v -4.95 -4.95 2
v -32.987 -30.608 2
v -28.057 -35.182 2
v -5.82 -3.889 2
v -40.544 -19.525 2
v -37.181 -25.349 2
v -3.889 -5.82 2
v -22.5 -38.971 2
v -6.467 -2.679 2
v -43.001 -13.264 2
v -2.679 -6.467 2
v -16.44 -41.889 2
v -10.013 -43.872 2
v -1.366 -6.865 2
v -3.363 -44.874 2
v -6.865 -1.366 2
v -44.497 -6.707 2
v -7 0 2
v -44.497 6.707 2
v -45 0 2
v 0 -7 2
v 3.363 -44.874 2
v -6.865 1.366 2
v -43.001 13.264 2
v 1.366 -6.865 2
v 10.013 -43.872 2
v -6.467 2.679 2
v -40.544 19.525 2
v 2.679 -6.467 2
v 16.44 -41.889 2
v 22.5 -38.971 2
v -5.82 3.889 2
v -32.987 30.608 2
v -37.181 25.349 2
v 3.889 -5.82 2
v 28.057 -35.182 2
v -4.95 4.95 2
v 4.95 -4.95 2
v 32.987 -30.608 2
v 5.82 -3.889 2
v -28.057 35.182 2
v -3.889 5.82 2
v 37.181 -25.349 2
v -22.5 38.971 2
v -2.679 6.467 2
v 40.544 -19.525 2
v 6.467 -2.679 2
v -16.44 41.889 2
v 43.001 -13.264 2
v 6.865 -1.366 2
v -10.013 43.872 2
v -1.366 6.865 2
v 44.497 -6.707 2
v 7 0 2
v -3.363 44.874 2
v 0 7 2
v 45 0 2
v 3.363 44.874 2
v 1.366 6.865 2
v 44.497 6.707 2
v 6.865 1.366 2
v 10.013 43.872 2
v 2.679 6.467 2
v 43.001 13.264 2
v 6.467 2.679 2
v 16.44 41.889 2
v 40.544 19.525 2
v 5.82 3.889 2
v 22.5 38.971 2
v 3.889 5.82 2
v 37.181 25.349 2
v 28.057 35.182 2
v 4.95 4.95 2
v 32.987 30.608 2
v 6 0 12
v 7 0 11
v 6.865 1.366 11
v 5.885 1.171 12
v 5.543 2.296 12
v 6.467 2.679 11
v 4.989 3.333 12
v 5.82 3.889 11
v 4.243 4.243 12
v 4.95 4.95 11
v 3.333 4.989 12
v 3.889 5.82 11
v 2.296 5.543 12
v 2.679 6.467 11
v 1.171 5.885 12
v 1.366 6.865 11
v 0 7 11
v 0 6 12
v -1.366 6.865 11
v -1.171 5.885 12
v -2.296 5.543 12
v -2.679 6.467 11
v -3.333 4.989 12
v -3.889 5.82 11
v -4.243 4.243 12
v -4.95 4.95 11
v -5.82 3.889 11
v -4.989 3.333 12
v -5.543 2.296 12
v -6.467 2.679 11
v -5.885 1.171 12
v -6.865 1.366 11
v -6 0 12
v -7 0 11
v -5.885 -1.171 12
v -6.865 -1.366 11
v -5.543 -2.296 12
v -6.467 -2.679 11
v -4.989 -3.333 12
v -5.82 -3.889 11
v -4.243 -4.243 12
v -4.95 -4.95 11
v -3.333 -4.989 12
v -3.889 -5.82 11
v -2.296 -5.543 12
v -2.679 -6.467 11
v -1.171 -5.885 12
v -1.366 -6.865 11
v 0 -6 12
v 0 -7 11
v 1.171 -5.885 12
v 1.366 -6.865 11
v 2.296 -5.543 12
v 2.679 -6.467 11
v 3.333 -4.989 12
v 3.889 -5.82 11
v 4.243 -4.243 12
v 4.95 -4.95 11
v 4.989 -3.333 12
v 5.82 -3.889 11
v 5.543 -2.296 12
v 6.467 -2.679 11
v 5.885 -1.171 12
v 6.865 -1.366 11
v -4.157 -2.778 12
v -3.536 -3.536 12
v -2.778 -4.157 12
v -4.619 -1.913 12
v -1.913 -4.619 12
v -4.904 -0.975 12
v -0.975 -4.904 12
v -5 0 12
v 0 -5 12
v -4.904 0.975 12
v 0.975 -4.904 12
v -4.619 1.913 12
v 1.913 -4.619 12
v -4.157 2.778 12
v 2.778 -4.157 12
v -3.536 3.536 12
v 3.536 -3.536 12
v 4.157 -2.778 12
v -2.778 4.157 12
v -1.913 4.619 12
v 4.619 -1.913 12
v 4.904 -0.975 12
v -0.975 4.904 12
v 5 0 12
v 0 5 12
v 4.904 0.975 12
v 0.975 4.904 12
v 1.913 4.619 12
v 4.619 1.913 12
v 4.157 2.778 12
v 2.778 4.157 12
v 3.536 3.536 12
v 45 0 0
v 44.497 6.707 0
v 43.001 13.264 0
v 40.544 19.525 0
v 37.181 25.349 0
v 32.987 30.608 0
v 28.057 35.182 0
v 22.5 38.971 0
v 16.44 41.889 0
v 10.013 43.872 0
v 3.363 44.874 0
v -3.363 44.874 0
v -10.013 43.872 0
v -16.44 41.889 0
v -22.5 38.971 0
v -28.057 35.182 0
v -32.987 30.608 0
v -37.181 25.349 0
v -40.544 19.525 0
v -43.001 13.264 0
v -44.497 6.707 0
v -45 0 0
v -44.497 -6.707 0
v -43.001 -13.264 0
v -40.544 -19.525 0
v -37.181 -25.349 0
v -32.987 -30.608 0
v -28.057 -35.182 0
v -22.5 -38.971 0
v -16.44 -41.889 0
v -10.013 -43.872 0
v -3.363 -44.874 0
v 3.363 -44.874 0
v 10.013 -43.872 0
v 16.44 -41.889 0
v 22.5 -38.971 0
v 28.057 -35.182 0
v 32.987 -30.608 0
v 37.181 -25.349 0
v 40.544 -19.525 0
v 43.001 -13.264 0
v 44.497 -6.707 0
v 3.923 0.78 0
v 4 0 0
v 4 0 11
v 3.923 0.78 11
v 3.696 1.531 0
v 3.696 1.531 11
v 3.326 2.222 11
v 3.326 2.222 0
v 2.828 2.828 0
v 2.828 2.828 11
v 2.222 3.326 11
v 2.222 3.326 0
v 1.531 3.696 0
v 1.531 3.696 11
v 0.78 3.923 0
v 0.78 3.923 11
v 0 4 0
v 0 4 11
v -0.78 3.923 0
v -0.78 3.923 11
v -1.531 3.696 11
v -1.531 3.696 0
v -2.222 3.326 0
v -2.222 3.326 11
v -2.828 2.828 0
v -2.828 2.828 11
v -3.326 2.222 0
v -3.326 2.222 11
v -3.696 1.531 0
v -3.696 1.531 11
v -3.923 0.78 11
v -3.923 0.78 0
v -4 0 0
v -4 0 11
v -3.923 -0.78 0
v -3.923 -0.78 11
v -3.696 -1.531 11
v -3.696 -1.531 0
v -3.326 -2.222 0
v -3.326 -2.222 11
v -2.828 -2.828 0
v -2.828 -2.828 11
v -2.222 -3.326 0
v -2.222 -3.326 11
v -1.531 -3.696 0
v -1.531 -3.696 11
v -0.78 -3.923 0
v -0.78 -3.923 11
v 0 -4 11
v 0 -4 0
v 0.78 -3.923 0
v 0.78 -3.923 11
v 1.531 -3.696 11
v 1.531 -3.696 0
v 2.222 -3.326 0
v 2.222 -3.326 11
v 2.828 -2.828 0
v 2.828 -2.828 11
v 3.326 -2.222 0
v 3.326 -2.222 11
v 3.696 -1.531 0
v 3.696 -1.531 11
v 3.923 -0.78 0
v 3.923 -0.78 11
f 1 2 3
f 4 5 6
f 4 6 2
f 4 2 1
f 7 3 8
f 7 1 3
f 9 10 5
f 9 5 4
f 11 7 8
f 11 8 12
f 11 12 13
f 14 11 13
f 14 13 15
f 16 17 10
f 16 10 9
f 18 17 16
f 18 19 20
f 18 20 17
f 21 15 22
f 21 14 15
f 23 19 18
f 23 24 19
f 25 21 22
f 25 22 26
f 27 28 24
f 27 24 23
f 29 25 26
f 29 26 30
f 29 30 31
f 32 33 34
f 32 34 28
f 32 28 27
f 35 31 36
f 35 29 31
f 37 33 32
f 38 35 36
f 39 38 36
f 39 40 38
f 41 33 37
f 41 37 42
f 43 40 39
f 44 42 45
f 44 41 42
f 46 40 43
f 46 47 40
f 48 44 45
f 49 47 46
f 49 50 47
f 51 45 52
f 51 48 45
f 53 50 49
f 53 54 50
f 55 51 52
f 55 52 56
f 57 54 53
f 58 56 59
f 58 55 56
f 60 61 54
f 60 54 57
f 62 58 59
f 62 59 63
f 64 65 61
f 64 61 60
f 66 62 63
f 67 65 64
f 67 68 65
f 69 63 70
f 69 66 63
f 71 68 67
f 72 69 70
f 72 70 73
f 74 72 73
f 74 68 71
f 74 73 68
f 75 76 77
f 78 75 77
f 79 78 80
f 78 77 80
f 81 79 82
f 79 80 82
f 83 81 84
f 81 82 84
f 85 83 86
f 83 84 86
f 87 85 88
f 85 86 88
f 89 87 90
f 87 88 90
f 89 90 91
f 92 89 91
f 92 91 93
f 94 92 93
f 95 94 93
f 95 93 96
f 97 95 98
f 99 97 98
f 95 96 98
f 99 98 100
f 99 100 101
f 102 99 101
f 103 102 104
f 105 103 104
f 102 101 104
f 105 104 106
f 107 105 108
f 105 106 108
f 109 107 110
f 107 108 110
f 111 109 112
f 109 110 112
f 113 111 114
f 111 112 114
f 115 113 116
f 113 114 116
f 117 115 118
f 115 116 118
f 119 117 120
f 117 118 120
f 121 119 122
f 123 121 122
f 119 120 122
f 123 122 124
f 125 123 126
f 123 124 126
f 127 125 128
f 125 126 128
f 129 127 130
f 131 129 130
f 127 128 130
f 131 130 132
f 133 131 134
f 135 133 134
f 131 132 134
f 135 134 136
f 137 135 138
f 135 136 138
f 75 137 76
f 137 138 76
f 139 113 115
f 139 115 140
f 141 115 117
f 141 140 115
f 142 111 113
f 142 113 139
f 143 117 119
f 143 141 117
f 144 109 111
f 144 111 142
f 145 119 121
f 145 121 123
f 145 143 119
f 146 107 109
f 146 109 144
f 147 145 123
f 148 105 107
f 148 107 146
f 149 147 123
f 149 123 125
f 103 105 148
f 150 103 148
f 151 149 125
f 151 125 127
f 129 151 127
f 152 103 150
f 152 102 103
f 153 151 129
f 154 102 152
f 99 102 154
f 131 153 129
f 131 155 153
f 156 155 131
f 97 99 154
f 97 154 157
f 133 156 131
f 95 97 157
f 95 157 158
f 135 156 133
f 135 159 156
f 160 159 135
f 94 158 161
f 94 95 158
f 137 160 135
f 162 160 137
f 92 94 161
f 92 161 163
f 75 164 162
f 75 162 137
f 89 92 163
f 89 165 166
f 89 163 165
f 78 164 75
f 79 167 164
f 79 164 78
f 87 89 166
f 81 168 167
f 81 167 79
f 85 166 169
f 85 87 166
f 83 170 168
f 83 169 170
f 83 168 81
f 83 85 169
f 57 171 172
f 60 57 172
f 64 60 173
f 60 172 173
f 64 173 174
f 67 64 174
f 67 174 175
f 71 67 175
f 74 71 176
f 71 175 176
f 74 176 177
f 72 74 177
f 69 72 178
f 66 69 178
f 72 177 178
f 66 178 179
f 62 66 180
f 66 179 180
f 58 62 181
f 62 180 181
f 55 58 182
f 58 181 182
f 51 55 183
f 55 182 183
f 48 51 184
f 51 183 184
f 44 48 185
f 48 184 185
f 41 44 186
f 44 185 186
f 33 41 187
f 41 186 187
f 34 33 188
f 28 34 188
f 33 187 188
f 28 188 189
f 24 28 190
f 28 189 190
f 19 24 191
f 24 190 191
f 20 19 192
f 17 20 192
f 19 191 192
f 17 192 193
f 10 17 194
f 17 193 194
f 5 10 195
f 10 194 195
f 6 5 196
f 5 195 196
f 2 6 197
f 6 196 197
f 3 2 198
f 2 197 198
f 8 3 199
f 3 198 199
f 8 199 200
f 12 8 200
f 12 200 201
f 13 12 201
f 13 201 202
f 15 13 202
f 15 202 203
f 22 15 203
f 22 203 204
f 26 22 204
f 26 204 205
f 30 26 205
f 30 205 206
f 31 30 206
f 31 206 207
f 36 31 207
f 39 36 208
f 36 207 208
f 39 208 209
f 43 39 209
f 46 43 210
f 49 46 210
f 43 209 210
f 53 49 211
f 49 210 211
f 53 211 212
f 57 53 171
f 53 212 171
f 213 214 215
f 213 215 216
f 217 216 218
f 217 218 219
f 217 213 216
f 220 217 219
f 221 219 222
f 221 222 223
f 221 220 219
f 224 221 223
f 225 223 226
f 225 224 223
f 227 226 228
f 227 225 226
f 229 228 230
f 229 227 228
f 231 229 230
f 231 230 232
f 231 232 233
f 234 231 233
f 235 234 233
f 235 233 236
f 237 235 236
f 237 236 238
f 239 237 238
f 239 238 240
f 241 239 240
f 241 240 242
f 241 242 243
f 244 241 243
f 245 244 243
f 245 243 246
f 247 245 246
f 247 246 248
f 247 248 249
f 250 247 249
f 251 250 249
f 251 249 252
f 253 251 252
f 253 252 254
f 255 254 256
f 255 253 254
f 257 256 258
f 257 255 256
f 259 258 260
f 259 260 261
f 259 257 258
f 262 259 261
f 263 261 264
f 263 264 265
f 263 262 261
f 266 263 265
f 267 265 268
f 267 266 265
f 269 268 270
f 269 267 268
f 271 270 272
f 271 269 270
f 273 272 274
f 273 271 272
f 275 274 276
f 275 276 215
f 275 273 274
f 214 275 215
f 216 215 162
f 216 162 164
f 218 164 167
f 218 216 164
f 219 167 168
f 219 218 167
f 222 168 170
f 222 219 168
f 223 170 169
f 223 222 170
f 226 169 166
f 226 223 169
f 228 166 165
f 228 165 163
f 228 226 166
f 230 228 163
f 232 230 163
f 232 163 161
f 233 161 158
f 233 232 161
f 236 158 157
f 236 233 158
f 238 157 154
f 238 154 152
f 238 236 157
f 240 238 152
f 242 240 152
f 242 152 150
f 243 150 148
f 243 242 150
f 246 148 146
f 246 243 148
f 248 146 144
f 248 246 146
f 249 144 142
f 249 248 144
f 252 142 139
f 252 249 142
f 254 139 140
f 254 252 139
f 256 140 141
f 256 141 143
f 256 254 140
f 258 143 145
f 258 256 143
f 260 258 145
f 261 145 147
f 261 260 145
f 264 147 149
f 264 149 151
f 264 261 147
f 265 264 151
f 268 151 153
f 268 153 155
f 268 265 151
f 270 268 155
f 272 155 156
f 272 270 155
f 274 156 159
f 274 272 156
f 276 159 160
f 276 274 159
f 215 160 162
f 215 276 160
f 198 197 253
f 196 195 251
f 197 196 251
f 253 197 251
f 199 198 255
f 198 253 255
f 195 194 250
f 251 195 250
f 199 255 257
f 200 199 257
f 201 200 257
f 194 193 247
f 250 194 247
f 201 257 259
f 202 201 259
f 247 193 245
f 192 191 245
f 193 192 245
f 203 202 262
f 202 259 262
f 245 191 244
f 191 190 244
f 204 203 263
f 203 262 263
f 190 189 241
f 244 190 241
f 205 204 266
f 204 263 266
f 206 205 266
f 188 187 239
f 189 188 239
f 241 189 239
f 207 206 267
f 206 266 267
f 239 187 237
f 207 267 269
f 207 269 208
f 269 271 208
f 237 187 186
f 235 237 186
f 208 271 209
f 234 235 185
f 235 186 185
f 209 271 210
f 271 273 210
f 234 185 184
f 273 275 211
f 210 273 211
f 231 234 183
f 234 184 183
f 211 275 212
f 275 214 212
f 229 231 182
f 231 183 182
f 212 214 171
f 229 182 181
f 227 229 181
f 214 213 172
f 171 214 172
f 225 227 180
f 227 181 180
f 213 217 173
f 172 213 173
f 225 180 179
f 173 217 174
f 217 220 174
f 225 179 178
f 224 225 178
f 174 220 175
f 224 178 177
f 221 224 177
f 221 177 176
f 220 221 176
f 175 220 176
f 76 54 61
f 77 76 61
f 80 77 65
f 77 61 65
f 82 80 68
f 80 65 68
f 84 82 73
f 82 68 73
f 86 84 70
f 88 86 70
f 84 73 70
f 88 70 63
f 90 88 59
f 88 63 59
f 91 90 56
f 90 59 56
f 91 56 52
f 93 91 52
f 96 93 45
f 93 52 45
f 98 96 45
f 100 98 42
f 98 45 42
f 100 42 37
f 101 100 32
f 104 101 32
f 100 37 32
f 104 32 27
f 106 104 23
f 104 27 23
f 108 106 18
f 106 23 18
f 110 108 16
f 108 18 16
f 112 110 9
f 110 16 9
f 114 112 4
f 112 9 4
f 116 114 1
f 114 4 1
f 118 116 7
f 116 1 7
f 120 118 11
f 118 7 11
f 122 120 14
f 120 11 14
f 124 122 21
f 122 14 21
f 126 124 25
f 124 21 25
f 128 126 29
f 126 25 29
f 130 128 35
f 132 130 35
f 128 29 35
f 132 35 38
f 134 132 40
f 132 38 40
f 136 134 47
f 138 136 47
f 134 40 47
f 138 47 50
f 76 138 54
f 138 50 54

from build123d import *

# Parameters (mm, degrees)
SKETCH_R        = 45
SKETCH_R_2      = 4
PAD_DEPTH       = 2
SKETCH001_R     = 7
SKETCH001_R_2   = 4
PAD001_DEPTH    = 10
CHAMFER_SIZE    = 1
CHAMFER001_SIZE = 1


with BuildPart() as part:
    # Sketch → Pad (new body)
    with BuildSketch(Plane.XY):
        Circle(SKETCH_R)
        Circle(SKETCH_R_2, mode=Mode.SUBTRACT)
    extrude(amount=PAD_DEPTH)

    # Sketch001 (on Face4 of Pad) → Pad001 (join)
    with BuildSketch(Plane.XY.offset(2)):
        Circle(SKETCH001_R)
        Circle(SKETCH001_R_2, mode=Mode.SUBTRACT)
    extrude(amount=PAD001_DEPTH)

    # Chamfer
    chamfer_edges = [part.edges().sort_by_distance(p)[0] for p in [
        (-4, 0, 12),
    ]]
    chamfer(chamfer_edges, length=CHAMFER_SIZE)

    # Chamfer001
    chamfer001_edges = [part.edges().sort_by_distance(p)[0] for p in [
        (-7, 0, 12),
    ]]
    chamfer(chamfer001_edges, length=CHAMFER001_SIZE)


solid = part.part
